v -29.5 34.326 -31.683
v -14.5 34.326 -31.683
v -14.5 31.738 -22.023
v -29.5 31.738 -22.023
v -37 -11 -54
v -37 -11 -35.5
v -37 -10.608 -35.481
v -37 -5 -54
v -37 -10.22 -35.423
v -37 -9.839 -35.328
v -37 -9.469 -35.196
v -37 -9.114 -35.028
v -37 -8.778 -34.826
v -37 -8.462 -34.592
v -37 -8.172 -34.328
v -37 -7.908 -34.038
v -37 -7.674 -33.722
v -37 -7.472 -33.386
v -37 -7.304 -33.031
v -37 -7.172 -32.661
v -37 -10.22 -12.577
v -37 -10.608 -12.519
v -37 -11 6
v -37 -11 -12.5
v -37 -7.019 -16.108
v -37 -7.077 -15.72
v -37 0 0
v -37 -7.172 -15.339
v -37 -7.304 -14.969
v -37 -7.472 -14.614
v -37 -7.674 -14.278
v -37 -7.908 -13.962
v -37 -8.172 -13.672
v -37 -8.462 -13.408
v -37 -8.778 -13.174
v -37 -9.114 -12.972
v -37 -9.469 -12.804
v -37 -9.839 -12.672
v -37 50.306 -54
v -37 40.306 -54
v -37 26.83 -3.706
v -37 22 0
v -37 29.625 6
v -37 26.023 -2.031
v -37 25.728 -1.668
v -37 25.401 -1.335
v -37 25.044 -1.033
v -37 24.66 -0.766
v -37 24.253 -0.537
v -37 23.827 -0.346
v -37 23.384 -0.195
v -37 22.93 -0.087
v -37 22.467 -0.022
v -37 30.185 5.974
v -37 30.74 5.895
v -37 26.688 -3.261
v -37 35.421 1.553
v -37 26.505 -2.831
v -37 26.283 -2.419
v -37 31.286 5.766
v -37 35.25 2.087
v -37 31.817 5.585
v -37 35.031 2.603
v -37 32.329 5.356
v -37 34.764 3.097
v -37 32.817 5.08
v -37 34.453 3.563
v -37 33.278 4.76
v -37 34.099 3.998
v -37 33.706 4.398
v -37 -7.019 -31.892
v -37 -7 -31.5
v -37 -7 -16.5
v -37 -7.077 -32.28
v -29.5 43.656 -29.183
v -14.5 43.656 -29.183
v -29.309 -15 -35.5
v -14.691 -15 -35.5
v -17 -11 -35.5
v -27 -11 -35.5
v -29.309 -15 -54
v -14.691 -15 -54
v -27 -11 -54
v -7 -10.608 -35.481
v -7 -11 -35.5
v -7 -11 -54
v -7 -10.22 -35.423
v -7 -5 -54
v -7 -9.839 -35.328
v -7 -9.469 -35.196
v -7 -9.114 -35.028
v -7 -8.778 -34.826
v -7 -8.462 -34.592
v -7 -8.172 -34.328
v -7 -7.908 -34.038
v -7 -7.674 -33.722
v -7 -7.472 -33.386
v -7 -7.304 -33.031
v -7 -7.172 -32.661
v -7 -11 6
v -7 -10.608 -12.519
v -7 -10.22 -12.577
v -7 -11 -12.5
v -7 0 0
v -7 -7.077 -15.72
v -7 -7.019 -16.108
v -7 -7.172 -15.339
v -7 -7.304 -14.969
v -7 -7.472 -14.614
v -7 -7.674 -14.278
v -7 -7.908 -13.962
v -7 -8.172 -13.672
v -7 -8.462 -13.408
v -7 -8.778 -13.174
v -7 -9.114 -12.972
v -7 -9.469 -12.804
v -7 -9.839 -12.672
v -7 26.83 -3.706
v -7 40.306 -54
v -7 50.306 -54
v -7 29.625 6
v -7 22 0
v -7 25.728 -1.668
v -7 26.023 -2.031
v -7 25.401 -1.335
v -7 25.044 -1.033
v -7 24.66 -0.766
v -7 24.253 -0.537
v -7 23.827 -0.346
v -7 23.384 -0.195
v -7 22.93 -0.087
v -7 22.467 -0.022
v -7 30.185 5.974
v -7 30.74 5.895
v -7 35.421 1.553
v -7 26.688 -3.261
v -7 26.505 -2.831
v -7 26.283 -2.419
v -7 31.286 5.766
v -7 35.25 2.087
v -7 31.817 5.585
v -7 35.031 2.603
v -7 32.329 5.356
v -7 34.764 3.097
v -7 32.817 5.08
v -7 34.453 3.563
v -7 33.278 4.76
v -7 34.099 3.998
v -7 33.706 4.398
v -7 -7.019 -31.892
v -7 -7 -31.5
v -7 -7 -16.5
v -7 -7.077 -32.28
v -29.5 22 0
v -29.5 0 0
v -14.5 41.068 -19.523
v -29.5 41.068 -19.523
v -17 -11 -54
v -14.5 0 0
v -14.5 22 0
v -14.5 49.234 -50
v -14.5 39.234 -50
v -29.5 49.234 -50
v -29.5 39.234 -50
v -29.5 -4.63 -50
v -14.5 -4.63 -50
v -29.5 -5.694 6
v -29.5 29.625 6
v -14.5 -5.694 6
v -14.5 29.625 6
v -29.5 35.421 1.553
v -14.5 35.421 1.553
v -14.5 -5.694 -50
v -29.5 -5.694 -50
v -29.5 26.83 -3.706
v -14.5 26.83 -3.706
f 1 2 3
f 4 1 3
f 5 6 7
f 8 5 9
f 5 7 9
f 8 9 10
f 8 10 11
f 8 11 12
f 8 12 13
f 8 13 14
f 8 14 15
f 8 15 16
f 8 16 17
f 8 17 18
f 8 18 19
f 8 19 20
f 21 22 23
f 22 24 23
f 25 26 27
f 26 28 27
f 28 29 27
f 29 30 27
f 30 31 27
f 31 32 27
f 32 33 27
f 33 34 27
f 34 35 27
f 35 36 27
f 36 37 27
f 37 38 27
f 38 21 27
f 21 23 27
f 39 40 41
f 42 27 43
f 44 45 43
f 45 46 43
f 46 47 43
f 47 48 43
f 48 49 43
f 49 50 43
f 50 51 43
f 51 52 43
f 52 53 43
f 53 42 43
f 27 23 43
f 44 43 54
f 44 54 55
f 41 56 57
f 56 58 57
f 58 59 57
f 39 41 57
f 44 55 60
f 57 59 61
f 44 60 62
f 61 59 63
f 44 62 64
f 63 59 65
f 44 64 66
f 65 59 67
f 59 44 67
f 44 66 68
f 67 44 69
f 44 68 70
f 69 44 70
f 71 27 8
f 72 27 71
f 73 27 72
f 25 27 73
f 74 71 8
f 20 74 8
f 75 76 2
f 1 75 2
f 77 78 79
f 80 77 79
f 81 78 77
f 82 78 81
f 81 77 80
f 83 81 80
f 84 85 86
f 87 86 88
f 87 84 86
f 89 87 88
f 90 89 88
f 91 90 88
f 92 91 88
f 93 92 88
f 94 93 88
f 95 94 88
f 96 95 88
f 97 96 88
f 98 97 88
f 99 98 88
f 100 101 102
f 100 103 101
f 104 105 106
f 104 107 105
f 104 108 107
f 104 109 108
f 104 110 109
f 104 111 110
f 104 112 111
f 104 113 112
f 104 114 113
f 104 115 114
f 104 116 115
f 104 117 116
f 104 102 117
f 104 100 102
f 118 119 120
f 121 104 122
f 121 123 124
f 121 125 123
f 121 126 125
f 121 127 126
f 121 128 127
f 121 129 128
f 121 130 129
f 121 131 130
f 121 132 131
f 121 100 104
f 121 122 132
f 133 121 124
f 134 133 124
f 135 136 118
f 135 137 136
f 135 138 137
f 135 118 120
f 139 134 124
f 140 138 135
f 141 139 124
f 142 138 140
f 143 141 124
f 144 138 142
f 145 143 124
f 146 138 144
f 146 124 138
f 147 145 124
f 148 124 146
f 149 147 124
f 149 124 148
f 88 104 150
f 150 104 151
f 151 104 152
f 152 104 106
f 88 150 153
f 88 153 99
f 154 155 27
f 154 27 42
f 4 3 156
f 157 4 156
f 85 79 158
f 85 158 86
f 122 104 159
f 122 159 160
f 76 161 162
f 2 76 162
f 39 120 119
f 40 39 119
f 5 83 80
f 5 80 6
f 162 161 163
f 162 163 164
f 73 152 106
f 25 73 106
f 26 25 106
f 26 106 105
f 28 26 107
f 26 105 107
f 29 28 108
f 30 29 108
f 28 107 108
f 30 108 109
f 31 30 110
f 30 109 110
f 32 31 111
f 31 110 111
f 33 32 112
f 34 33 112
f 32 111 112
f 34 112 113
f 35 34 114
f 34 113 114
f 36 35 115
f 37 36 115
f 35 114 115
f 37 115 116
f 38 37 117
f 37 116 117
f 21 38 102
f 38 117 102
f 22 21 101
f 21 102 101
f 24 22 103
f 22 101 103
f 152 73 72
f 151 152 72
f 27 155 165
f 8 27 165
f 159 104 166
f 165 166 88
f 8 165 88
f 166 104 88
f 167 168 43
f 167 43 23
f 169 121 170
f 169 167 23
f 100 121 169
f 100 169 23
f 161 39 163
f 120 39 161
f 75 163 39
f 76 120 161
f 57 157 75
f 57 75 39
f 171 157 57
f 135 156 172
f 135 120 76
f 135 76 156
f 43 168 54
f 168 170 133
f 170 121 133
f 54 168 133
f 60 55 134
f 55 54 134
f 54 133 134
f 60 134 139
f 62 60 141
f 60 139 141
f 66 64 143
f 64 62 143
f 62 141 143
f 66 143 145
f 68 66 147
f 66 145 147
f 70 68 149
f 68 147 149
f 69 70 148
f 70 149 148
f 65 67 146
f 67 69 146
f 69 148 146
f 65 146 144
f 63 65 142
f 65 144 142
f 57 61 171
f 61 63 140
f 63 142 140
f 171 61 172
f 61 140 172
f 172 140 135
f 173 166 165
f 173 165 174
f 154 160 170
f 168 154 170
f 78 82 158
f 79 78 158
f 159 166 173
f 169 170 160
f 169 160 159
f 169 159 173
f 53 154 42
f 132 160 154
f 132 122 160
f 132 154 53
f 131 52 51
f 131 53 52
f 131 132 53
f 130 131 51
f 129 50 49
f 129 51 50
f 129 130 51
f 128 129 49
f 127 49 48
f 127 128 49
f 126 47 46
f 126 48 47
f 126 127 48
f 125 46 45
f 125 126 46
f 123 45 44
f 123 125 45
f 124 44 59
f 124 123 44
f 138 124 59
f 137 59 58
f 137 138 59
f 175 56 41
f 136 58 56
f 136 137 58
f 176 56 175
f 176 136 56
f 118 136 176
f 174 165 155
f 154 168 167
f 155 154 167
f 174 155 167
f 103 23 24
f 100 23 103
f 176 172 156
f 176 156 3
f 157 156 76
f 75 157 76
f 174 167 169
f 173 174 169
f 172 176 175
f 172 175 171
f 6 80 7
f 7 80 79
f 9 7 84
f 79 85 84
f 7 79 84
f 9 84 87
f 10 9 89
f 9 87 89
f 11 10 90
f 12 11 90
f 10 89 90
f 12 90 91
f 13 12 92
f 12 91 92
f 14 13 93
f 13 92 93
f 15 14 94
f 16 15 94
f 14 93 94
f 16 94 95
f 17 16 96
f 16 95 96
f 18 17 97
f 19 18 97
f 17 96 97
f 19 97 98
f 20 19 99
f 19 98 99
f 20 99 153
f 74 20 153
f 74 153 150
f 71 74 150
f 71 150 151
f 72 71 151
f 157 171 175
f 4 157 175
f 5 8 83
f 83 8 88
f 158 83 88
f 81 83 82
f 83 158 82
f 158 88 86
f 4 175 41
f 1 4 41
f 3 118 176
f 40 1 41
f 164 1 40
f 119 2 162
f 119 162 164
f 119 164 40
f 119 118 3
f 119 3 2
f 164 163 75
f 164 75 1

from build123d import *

# Parameters (mm, degrees)
PAD015_DEPTH         = 15
POCKET012_DEPTH      = 187.2426560764
POCKET012_DEPTH_BACK = 247.2426560764
SKETCH035_W          = 4
SKETCH035_H          = 14.6188021535
POCKET014_DEPTH      = 25
SKETCH040_W          = 56
SKETCH040_H          = 15
POCKET020_DEPTH      = 56
PAD021_DEPTH         = 15


with BuildPart() as part:
    # Sketch027 → Pad015 (new body, symmetric)
    with BuildSketch(Plane.YZ):
        with BuildLine():
            Line((-15, 6), (-15, -12.5))
            Line((-15, -12.5), (-11, -12.5))
            ThreePointArc((-7, -16.5), (-8.1715728753, -13.6715728753), (-11, -12.5))
            Line((-7, -16.5), (-7, -31.5))
            ThreePointArc((-11, -35.5), (-8.1715728753, -34.3284271247), (-7, -31.5))
            Line((-15, -35.5), (-11, -35.5))
            Line((-15, -35.5), (-15, -54))
            Line((-5, -54), (-15, -54))
            Line((0, 0), (-5, -54))
            Line((0, 0), (22, 0))
            ThreePointArc((26.8296291314, -3.7059047745), (25.043807145, -1.0332332985), (22, 0))
            Line((26.8296291314, -3.7059047745), (40.3058913312, -54))
            Line((50.3058913312, -54), (40.3058913312, -54))
            Line((50.3058913312, -54), (35.4205328152, 1.5529142706))
            ThreePointArc((35.4205328152, 1.5529142706), (33.2775464315, 4.7601200417), (29.6249778574, 6))
            Line((29.6249778574, 6), (-15, 6))
        make_face()
    extrude(amount=PAD015_DEPTH, both=True)

    # Sketch033 → Pocket012 (cut, two sides)
    with BuildSketch(Plane.XY.offset(-54)) as pocket012_sk:
        Polygon((-15, -11), (-15, -15), (-7.3094010768, -15), (-5, -11), align=None)
    pocket012 = extrude(amount=-POCKET012_DEPTH, mode=Mode.SUBTRACT) + extrude(pocket012_sk.sketch, amount=POCKET012_DEPTH_BACK, mode=Mode.SUBTRACT)

    # Mirrored004: Pocket012 across YZ
    add(pocket012.mirror(Plane.YZ), mode=Mode.SUBTRACT)

    # Sketch035 (on Face11 of Mirrored004) → Pocket014 (cut)
    with BuildSketch(Plane.YX.offset(-6)):
        with Locations((-13, 0)):
            Rectangle(SKETCH035_W, SKETCH035_H)
    extrude(amount=POCKET014_DEPTH, mode=Mode.SUBTRACT)

    # Sketch040 (on Face7 of Pocket014) → Pocket020 (cut)
    with BuildSketch(Plane(origin=(0, 0, 6), x_dir=(0, -1, 0), z_dir=(0, 0, 1))):
        with Locations((-22.3058913312, 0)):
            Rectangle(SKETCH040_W, SKETCH040_H)
    extrude(amount=-POCKET020_DEPTH, mode=Mode.SUBTRACT)

    # Sketch042 (on Face6 of Pocket020) → Pad021 (join)
    with BuildSketch(Plane(origin=(7.5, 0, 0), x_dir=(0, 1, 0), z_dir=(-1, 0, 0))):
        with BuildLine():
            Line((26.8296291314, 3.7059047745), (35.4205328152, -1.5529142706))
            ThreePointArc((29.6249778574, -6), (33.2775464315, -4.7601200417), (35.4205328152, -1.5529142706))
            Line((22, 0), (29.6249778574, -6))
            ThreePointArc((22, 0), (25.043807145, 1.0332332985), (26.8296291314, 3.7059047745))
        make_face()
        Polygon((34.325957072, 31.6825815187), (31.7377666209, 22.0233232558), (41.0678936399, 19.5233232558), (43.6560840909, 29.1825815187), align=None)
    extrude(amount=PAD021_DEPTH)


with BuildPart() as part_1:
    # Body014 placement: moved
    add(part.part.moved(Location((-22, 0, 0))))


solid = part_1.part
